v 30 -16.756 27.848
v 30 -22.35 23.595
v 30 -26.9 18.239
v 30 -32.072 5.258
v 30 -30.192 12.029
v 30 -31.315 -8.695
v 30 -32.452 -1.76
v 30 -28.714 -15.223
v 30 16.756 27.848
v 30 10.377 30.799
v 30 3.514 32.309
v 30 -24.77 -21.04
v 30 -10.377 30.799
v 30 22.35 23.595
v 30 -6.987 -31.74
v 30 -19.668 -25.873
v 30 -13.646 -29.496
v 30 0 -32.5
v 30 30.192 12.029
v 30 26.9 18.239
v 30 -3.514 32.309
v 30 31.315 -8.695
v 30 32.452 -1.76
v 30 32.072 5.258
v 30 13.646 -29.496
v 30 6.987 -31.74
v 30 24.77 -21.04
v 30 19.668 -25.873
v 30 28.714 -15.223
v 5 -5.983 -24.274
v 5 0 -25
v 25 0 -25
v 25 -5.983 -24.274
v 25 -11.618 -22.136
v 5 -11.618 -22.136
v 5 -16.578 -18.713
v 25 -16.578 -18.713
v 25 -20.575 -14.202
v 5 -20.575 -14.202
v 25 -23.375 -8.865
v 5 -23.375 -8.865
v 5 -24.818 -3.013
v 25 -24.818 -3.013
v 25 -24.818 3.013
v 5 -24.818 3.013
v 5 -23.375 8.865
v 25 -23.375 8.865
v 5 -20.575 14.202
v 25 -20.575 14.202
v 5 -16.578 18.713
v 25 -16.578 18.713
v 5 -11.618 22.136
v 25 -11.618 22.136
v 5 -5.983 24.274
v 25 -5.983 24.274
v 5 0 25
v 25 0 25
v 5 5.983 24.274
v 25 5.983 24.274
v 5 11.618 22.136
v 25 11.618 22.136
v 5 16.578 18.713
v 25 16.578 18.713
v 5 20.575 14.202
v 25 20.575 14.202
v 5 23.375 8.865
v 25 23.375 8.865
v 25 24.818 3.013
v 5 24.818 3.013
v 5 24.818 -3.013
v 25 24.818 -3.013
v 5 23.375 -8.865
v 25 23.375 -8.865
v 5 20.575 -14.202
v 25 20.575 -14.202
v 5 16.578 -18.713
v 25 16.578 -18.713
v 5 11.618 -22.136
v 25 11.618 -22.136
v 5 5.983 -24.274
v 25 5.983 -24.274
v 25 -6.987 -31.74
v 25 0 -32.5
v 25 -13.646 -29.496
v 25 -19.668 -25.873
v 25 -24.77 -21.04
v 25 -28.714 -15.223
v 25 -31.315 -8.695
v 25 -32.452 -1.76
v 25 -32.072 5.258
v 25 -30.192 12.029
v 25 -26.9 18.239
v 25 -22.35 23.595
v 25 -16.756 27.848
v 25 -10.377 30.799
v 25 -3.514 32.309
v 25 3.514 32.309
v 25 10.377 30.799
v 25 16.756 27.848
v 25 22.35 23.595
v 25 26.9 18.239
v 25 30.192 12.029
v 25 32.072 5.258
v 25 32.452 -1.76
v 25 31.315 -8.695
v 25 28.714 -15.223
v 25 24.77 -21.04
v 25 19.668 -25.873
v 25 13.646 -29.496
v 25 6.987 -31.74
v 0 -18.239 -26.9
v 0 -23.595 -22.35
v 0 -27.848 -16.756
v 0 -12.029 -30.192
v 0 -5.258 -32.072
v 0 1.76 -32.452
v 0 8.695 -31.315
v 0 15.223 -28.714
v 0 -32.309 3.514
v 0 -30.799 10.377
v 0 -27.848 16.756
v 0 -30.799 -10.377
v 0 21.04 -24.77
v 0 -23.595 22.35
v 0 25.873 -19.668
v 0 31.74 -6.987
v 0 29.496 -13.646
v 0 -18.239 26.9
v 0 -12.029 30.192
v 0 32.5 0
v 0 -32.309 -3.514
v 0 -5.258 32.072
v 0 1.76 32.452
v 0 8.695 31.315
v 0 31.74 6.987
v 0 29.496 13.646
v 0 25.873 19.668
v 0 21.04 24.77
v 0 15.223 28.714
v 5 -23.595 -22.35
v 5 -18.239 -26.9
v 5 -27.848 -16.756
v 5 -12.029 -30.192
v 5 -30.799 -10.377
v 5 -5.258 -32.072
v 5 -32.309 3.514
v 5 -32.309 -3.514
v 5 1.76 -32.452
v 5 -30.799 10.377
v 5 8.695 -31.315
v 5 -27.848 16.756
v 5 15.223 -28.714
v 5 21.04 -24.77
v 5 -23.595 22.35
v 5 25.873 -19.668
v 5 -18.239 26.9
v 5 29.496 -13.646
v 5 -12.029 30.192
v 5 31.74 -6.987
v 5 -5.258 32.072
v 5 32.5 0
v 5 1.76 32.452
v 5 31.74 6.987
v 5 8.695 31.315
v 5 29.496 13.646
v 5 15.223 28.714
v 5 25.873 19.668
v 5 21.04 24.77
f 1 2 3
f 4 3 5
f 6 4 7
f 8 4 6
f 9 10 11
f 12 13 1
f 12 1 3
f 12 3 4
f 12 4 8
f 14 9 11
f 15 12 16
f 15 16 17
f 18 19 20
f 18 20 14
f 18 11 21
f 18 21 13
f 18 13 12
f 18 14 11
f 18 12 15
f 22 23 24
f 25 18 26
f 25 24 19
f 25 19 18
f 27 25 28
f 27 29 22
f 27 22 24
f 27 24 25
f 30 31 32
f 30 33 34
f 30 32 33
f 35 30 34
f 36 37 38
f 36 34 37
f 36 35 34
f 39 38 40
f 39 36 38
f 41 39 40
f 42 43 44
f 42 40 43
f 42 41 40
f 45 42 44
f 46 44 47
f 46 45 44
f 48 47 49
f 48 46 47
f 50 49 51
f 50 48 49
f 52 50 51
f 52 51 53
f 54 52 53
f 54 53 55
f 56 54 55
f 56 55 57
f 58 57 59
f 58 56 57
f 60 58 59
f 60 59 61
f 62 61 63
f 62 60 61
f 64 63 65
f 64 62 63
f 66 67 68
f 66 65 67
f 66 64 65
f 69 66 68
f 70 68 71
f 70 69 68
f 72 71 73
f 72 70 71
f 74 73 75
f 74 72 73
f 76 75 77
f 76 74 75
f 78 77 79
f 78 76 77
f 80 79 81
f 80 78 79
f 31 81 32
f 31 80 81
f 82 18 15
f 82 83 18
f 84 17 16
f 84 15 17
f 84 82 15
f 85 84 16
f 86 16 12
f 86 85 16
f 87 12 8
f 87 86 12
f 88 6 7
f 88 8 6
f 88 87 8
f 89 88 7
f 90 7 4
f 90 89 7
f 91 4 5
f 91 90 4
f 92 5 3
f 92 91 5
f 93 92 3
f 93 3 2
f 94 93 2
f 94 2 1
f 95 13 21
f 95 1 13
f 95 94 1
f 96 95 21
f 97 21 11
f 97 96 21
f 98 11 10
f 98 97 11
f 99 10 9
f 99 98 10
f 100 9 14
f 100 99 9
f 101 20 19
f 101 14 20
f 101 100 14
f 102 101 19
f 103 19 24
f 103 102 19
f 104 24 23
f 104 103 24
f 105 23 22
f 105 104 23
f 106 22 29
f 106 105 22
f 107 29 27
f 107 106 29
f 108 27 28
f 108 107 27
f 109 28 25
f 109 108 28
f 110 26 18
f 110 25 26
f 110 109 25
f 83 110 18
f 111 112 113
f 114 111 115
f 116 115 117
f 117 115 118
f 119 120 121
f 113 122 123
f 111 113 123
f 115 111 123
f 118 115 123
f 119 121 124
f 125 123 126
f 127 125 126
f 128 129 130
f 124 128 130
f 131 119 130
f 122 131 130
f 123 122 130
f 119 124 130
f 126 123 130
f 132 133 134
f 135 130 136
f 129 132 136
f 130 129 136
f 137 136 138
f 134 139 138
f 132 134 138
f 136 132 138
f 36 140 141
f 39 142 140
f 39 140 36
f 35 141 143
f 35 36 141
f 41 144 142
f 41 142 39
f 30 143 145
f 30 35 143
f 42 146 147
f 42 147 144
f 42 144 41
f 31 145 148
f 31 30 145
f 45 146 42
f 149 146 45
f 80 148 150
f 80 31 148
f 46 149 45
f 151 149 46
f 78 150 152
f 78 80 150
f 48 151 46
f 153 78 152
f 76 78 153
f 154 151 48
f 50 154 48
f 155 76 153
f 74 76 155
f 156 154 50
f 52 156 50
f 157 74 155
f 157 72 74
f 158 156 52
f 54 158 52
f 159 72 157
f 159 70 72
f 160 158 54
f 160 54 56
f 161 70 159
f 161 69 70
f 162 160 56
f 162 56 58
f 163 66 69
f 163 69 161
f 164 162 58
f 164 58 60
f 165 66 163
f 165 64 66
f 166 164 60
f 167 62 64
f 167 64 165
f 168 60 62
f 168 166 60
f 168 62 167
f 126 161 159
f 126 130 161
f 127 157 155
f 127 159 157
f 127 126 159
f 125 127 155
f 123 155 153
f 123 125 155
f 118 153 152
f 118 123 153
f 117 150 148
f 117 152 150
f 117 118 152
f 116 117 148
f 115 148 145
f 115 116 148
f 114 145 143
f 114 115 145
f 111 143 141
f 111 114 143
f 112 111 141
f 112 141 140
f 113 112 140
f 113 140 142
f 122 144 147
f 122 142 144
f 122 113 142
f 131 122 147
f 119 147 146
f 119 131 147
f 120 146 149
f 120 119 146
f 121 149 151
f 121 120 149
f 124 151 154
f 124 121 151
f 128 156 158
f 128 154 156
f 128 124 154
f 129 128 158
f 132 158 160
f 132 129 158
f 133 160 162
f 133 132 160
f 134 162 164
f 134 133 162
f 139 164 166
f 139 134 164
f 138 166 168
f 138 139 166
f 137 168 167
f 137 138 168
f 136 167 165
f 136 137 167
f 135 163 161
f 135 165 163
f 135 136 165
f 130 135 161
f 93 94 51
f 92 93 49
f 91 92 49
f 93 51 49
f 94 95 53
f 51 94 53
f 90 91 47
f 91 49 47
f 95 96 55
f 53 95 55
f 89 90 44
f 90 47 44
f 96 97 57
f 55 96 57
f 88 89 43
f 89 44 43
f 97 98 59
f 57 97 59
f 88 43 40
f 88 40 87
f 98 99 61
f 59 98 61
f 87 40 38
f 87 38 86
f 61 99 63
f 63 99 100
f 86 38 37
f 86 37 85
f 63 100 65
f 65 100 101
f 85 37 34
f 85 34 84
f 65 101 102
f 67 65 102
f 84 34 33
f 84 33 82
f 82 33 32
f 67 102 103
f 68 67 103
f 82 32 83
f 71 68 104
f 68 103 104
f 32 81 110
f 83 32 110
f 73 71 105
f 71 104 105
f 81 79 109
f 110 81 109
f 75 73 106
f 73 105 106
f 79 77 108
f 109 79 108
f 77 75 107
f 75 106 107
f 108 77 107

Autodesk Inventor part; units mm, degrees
ref_plane "YZ Plane" through (0, 0, 0) normal (1, 0, 0) x (0, 1, 0)
ref_plane "XZ Plane" through (0, 0, 0) normal (0, 1, 0) x (-1, 0, 0)
ref_plane "XY Plane" through (0, 0, 0) normal (0, 0, 1) x (1, 0, 0)
sketch "Sketch1" plane through (0, 0, 0) normal (1, 0, 0) x (0, 1, 0)
  circle A0 centre (0, 0) radius 32.5
  dimension "d1" = 65
extrude "Extrusion3" add sketch "Sketch1" along normal blind 5
sketch "Sketch3" plane through (5, 0, 0) normal (1, 0, 0) x (0, 0, -1)
  circle A0 centre (0, 0) radius 25
  dimension "d9" = 50
extrude "Extrusion4" add sketch "Sketch3" along normal blind 20
sketch "Sketch4" plane through (25, 0, 0) normal (1, 0, 0) x (0, 0, -1)
  circle A0 centre (0, 0) radius 25 projected
  circle A1 centre (0, 0) radius 32.5
  dimension "d12" = 65
extrude "Extrusion5" add sketch "Sketch4" along normal blind 5 contours A0 | A1
sketch "Sketch5" plane through (0, 0, 0) normal (-1, 0, 0) x (0, 0, 1)
  point P0 (0, 0)
equation "\"d12\" = d1"
properties part number "pully"
